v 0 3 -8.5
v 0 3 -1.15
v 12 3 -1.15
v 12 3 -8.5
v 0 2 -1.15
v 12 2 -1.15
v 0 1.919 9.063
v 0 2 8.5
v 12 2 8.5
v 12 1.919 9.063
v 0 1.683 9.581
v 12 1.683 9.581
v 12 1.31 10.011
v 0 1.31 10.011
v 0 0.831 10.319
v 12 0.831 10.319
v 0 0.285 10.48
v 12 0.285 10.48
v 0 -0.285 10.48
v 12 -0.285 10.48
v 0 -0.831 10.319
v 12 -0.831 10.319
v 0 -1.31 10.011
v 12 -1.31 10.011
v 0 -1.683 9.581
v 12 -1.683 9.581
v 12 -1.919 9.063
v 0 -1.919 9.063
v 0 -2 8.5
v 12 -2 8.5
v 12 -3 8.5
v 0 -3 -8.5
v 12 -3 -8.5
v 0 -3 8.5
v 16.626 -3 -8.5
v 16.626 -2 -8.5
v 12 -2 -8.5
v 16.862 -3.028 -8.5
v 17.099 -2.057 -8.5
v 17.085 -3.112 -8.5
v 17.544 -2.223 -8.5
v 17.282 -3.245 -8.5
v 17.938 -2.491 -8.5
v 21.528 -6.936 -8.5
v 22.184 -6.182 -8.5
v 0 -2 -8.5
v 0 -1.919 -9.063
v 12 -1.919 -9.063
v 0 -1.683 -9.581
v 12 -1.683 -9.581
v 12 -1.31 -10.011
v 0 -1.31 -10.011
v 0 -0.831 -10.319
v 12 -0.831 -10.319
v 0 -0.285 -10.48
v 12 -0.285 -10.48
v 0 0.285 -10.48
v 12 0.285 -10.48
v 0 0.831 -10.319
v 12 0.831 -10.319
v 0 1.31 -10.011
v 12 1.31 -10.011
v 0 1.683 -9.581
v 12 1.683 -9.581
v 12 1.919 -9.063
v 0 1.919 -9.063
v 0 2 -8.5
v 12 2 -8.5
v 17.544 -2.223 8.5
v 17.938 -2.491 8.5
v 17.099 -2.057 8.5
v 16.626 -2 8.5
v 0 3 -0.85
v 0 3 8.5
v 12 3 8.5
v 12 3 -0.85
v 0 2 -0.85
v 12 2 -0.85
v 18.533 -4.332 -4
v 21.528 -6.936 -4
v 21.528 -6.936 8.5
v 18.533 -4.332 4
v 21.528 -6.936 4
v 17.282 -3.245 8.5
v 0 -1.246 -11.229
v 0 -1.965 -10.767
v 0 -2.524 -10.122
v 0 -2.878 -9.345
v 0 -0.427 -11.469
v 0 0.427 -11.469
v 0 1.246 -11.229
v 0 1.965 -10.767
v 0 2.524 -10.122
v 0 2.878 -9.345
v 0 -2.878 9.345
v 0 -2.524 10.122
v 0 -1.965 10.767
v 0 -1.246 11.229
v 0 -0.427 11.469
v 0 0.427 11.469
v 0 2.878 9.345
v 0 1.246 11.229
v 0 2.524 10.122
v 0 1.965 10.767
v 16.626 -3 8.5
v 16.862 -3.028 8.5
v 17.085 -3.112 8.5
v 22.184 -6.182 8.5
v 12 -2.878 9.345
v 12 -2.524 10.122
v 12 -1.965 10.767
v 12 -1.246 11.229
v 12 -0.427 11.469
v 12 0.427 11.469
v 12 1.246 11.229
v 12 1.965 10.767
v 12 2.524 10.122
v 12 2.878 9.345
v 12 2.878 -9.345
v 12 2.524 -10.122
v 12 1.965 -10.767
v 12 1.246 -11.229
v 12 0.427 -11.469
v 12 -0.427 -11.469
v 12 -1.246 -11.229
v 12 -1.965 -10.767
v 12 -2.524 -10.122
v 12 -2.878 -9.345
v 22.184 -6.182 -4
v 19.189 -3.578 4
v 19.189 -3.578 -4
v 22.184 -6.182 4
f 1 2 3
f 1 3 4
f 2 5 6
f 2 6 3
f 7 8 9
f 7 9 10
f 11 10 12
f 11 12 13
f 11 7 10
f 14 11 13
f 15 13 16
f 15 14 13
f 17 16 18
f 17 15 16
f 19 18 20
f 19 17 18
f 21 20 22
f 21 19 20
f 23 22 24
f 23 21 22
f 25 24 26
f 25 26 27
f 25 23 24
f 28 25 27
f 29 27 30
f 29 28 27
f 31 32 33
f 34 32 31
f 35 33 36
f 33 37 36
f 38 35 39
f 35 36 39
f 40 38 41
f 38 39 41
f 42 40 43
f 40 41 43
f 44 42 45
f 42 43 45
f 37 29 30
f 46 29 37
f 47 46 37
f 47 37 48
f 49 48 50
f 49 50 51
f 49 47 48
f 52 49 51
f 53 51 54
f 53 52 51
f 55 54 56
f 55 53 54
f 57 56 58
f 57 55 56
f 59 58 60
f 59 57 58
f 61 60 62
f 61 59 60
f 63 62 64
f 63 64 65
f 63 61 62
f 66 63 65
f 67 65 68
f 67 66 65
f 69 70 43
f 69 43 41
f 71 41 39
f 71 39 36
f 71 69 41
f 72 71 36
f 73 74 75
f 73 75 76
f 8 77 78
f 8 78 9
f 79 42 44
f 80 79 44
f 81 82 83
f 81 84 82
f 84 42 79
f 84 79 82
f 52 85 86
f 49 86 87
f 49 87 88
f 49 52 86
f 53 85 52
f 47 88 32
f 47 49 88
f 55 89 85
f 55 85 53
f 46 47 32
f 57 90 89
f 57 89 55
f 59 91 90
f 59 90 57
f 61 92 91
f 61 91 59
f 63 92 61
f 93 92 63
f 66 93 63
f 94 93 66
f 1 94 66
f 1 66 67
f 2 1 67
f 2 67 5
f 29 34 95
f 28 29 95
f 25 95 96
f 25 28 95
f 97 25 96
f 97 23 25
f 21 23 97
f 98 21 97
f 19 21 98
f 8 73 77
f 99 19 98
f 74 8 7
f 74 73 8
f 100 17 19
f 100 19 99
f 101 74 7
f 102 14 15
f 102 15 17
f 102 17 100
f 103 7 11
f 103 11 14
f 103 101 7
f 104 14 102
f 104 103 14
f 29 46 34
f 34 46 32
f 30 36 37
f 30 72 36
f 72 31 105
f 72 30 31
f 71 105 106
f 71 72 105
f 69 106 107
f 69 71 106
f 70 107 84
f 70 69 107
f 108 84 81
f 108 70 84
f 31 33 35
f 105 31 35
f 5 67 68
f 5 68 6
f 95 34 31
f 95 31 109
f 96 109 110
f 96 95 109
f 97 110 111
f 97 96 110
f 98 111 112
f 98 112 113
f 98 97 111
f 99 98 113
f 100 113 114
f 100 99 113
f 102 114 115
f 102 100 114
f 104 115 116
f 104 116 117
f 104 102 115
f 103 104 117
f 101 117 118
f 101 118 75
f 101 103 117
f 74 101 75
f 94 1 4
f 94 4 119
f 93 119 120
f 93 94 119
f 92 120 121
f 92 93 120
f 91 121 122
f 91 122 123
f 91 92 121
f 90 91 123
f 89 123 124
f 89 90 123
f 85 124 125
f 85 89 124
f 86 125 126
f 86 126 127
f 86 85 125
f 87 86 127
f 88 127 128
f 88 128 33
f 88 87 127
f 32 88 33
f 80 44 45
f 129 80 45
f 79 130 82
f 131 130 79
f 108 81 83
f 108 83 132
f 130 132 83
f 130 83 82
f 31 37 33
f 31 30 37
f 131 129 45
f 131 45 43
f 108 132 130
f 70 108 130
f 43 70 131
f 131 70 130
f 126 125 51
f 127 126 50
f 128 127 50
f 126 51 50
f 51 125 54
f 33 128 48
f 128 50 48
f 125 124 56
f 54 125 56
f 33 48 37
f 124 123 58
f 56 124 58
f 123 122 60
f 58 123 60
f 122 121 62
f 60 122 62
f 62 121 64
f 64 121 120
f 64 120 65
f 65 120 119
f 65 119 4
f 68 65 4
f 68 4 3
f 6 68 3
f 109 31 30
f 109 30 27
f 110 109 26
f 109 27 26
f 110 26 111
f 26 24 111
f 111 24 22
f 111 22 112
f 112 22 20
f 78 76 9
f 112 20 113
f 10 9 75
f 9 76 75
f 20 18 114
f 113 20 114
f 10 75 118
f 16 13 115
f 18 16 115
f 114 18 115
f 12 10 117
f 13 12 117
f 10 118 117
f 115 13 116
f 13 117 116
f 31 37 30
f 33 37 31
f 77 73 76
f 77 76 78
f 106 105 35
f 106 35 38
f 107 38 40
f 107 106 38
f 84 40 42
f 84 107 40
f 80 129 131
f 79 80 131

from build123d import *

# Parameters (mm, degrees)
BOSS_EXTRUDE1_DEPTH = 12
BASE_FLANGE1_DEPTH  = 8.5
SKETCH7_W           = 8
SKETCH7_H           = 7.938725448
CUT_EXTRUDE1_DEPTH  = 1


# Sheet-metal steps are written as plain solids
with BuildPart() as part:
    # Sketch1 → Boss-Extrude1 (new body)
    with BuildSketch(Plane(origin=(0, 0, 0), x_dir=(0, 0, -1), z_dir=(1, 0, 0))):
        with BuildLine():
            Line((8.5, -3), (-8.5, -3))
            ThreePointArc((-8.5, -3), (-11.5, 0), (-8.5, 3))
            Line((-8.5, 3), (0.85, 3))
            Line((0.85, 3), (0.85, 2))
            Line((0.85, 2), (-8.5, 2))
            ThreePointArc((-8.5, 2), (-10.5, 0), (-8.5, -2))
            Line((-8.5, -2), (8.5, -2))
            ThreePointArc((8.5, -2), (10.5, 0), (8.5, 2))
            Line((8.5, 2), (1.15, 2))
            Line((1.15, 2), (1.15, 3))
            Line((1.15, 3), (8.5, 3))
            ThreePointArc((8.5, 3), (11.5, 0), (8.5, -3))
        make_face()
    extrude(amount=BOSS_EXTRUDE1_DEPTH)


with BuildPart() as body_2:
    # Sketch2 → Base-Flange1 (new, symmetric)
    with BuildSketch(Plane.XY):
        with BuildLine():
            Line((12, -3), (16.626115321, -3))
            ThreePointArc((16.626115321, -3), (16.976322702, -3.063327811), (17.28217435, -3.24529042))
            Line((17.28217435, -3.24529042), (21.528257481, -6.936354174))
            Line((21.528257481, -6.936354174), (22.18431651, -6.181644594))
            Line((22.18431651, -6.181644594), (17.938233378, -2.49058084))
            ThreePointArc((17.938233378, -2.49058084), (17.326530083, -2.126655622), (16.626115321, -2))
            Line((16.626115321, -2), (12, -2))
            Line((12, -2), (12, -3))
        make_face()
    extrude(amount=BASE_FLANGE1_DEPTH, both=True)

    # Sketch7 → Cut-Extrude1 (cut)
    with BuildSketch(Plane(origin=(6.487685568, 7.463228513, 0), x_dir=(0, 0, -1), z_dir=(0.6560590289905088, 0.7547095802227708, 0))):
        with Locations((0, -20.798239951)):
            Rectangle(SKETCH7_W, SKETCH7_H)
    extrude(amount=-CUT_EXTRUDE1_DEPTH, mode=Mode.SUBTRACT)


solid = Compound([part.part, body_2.part])
